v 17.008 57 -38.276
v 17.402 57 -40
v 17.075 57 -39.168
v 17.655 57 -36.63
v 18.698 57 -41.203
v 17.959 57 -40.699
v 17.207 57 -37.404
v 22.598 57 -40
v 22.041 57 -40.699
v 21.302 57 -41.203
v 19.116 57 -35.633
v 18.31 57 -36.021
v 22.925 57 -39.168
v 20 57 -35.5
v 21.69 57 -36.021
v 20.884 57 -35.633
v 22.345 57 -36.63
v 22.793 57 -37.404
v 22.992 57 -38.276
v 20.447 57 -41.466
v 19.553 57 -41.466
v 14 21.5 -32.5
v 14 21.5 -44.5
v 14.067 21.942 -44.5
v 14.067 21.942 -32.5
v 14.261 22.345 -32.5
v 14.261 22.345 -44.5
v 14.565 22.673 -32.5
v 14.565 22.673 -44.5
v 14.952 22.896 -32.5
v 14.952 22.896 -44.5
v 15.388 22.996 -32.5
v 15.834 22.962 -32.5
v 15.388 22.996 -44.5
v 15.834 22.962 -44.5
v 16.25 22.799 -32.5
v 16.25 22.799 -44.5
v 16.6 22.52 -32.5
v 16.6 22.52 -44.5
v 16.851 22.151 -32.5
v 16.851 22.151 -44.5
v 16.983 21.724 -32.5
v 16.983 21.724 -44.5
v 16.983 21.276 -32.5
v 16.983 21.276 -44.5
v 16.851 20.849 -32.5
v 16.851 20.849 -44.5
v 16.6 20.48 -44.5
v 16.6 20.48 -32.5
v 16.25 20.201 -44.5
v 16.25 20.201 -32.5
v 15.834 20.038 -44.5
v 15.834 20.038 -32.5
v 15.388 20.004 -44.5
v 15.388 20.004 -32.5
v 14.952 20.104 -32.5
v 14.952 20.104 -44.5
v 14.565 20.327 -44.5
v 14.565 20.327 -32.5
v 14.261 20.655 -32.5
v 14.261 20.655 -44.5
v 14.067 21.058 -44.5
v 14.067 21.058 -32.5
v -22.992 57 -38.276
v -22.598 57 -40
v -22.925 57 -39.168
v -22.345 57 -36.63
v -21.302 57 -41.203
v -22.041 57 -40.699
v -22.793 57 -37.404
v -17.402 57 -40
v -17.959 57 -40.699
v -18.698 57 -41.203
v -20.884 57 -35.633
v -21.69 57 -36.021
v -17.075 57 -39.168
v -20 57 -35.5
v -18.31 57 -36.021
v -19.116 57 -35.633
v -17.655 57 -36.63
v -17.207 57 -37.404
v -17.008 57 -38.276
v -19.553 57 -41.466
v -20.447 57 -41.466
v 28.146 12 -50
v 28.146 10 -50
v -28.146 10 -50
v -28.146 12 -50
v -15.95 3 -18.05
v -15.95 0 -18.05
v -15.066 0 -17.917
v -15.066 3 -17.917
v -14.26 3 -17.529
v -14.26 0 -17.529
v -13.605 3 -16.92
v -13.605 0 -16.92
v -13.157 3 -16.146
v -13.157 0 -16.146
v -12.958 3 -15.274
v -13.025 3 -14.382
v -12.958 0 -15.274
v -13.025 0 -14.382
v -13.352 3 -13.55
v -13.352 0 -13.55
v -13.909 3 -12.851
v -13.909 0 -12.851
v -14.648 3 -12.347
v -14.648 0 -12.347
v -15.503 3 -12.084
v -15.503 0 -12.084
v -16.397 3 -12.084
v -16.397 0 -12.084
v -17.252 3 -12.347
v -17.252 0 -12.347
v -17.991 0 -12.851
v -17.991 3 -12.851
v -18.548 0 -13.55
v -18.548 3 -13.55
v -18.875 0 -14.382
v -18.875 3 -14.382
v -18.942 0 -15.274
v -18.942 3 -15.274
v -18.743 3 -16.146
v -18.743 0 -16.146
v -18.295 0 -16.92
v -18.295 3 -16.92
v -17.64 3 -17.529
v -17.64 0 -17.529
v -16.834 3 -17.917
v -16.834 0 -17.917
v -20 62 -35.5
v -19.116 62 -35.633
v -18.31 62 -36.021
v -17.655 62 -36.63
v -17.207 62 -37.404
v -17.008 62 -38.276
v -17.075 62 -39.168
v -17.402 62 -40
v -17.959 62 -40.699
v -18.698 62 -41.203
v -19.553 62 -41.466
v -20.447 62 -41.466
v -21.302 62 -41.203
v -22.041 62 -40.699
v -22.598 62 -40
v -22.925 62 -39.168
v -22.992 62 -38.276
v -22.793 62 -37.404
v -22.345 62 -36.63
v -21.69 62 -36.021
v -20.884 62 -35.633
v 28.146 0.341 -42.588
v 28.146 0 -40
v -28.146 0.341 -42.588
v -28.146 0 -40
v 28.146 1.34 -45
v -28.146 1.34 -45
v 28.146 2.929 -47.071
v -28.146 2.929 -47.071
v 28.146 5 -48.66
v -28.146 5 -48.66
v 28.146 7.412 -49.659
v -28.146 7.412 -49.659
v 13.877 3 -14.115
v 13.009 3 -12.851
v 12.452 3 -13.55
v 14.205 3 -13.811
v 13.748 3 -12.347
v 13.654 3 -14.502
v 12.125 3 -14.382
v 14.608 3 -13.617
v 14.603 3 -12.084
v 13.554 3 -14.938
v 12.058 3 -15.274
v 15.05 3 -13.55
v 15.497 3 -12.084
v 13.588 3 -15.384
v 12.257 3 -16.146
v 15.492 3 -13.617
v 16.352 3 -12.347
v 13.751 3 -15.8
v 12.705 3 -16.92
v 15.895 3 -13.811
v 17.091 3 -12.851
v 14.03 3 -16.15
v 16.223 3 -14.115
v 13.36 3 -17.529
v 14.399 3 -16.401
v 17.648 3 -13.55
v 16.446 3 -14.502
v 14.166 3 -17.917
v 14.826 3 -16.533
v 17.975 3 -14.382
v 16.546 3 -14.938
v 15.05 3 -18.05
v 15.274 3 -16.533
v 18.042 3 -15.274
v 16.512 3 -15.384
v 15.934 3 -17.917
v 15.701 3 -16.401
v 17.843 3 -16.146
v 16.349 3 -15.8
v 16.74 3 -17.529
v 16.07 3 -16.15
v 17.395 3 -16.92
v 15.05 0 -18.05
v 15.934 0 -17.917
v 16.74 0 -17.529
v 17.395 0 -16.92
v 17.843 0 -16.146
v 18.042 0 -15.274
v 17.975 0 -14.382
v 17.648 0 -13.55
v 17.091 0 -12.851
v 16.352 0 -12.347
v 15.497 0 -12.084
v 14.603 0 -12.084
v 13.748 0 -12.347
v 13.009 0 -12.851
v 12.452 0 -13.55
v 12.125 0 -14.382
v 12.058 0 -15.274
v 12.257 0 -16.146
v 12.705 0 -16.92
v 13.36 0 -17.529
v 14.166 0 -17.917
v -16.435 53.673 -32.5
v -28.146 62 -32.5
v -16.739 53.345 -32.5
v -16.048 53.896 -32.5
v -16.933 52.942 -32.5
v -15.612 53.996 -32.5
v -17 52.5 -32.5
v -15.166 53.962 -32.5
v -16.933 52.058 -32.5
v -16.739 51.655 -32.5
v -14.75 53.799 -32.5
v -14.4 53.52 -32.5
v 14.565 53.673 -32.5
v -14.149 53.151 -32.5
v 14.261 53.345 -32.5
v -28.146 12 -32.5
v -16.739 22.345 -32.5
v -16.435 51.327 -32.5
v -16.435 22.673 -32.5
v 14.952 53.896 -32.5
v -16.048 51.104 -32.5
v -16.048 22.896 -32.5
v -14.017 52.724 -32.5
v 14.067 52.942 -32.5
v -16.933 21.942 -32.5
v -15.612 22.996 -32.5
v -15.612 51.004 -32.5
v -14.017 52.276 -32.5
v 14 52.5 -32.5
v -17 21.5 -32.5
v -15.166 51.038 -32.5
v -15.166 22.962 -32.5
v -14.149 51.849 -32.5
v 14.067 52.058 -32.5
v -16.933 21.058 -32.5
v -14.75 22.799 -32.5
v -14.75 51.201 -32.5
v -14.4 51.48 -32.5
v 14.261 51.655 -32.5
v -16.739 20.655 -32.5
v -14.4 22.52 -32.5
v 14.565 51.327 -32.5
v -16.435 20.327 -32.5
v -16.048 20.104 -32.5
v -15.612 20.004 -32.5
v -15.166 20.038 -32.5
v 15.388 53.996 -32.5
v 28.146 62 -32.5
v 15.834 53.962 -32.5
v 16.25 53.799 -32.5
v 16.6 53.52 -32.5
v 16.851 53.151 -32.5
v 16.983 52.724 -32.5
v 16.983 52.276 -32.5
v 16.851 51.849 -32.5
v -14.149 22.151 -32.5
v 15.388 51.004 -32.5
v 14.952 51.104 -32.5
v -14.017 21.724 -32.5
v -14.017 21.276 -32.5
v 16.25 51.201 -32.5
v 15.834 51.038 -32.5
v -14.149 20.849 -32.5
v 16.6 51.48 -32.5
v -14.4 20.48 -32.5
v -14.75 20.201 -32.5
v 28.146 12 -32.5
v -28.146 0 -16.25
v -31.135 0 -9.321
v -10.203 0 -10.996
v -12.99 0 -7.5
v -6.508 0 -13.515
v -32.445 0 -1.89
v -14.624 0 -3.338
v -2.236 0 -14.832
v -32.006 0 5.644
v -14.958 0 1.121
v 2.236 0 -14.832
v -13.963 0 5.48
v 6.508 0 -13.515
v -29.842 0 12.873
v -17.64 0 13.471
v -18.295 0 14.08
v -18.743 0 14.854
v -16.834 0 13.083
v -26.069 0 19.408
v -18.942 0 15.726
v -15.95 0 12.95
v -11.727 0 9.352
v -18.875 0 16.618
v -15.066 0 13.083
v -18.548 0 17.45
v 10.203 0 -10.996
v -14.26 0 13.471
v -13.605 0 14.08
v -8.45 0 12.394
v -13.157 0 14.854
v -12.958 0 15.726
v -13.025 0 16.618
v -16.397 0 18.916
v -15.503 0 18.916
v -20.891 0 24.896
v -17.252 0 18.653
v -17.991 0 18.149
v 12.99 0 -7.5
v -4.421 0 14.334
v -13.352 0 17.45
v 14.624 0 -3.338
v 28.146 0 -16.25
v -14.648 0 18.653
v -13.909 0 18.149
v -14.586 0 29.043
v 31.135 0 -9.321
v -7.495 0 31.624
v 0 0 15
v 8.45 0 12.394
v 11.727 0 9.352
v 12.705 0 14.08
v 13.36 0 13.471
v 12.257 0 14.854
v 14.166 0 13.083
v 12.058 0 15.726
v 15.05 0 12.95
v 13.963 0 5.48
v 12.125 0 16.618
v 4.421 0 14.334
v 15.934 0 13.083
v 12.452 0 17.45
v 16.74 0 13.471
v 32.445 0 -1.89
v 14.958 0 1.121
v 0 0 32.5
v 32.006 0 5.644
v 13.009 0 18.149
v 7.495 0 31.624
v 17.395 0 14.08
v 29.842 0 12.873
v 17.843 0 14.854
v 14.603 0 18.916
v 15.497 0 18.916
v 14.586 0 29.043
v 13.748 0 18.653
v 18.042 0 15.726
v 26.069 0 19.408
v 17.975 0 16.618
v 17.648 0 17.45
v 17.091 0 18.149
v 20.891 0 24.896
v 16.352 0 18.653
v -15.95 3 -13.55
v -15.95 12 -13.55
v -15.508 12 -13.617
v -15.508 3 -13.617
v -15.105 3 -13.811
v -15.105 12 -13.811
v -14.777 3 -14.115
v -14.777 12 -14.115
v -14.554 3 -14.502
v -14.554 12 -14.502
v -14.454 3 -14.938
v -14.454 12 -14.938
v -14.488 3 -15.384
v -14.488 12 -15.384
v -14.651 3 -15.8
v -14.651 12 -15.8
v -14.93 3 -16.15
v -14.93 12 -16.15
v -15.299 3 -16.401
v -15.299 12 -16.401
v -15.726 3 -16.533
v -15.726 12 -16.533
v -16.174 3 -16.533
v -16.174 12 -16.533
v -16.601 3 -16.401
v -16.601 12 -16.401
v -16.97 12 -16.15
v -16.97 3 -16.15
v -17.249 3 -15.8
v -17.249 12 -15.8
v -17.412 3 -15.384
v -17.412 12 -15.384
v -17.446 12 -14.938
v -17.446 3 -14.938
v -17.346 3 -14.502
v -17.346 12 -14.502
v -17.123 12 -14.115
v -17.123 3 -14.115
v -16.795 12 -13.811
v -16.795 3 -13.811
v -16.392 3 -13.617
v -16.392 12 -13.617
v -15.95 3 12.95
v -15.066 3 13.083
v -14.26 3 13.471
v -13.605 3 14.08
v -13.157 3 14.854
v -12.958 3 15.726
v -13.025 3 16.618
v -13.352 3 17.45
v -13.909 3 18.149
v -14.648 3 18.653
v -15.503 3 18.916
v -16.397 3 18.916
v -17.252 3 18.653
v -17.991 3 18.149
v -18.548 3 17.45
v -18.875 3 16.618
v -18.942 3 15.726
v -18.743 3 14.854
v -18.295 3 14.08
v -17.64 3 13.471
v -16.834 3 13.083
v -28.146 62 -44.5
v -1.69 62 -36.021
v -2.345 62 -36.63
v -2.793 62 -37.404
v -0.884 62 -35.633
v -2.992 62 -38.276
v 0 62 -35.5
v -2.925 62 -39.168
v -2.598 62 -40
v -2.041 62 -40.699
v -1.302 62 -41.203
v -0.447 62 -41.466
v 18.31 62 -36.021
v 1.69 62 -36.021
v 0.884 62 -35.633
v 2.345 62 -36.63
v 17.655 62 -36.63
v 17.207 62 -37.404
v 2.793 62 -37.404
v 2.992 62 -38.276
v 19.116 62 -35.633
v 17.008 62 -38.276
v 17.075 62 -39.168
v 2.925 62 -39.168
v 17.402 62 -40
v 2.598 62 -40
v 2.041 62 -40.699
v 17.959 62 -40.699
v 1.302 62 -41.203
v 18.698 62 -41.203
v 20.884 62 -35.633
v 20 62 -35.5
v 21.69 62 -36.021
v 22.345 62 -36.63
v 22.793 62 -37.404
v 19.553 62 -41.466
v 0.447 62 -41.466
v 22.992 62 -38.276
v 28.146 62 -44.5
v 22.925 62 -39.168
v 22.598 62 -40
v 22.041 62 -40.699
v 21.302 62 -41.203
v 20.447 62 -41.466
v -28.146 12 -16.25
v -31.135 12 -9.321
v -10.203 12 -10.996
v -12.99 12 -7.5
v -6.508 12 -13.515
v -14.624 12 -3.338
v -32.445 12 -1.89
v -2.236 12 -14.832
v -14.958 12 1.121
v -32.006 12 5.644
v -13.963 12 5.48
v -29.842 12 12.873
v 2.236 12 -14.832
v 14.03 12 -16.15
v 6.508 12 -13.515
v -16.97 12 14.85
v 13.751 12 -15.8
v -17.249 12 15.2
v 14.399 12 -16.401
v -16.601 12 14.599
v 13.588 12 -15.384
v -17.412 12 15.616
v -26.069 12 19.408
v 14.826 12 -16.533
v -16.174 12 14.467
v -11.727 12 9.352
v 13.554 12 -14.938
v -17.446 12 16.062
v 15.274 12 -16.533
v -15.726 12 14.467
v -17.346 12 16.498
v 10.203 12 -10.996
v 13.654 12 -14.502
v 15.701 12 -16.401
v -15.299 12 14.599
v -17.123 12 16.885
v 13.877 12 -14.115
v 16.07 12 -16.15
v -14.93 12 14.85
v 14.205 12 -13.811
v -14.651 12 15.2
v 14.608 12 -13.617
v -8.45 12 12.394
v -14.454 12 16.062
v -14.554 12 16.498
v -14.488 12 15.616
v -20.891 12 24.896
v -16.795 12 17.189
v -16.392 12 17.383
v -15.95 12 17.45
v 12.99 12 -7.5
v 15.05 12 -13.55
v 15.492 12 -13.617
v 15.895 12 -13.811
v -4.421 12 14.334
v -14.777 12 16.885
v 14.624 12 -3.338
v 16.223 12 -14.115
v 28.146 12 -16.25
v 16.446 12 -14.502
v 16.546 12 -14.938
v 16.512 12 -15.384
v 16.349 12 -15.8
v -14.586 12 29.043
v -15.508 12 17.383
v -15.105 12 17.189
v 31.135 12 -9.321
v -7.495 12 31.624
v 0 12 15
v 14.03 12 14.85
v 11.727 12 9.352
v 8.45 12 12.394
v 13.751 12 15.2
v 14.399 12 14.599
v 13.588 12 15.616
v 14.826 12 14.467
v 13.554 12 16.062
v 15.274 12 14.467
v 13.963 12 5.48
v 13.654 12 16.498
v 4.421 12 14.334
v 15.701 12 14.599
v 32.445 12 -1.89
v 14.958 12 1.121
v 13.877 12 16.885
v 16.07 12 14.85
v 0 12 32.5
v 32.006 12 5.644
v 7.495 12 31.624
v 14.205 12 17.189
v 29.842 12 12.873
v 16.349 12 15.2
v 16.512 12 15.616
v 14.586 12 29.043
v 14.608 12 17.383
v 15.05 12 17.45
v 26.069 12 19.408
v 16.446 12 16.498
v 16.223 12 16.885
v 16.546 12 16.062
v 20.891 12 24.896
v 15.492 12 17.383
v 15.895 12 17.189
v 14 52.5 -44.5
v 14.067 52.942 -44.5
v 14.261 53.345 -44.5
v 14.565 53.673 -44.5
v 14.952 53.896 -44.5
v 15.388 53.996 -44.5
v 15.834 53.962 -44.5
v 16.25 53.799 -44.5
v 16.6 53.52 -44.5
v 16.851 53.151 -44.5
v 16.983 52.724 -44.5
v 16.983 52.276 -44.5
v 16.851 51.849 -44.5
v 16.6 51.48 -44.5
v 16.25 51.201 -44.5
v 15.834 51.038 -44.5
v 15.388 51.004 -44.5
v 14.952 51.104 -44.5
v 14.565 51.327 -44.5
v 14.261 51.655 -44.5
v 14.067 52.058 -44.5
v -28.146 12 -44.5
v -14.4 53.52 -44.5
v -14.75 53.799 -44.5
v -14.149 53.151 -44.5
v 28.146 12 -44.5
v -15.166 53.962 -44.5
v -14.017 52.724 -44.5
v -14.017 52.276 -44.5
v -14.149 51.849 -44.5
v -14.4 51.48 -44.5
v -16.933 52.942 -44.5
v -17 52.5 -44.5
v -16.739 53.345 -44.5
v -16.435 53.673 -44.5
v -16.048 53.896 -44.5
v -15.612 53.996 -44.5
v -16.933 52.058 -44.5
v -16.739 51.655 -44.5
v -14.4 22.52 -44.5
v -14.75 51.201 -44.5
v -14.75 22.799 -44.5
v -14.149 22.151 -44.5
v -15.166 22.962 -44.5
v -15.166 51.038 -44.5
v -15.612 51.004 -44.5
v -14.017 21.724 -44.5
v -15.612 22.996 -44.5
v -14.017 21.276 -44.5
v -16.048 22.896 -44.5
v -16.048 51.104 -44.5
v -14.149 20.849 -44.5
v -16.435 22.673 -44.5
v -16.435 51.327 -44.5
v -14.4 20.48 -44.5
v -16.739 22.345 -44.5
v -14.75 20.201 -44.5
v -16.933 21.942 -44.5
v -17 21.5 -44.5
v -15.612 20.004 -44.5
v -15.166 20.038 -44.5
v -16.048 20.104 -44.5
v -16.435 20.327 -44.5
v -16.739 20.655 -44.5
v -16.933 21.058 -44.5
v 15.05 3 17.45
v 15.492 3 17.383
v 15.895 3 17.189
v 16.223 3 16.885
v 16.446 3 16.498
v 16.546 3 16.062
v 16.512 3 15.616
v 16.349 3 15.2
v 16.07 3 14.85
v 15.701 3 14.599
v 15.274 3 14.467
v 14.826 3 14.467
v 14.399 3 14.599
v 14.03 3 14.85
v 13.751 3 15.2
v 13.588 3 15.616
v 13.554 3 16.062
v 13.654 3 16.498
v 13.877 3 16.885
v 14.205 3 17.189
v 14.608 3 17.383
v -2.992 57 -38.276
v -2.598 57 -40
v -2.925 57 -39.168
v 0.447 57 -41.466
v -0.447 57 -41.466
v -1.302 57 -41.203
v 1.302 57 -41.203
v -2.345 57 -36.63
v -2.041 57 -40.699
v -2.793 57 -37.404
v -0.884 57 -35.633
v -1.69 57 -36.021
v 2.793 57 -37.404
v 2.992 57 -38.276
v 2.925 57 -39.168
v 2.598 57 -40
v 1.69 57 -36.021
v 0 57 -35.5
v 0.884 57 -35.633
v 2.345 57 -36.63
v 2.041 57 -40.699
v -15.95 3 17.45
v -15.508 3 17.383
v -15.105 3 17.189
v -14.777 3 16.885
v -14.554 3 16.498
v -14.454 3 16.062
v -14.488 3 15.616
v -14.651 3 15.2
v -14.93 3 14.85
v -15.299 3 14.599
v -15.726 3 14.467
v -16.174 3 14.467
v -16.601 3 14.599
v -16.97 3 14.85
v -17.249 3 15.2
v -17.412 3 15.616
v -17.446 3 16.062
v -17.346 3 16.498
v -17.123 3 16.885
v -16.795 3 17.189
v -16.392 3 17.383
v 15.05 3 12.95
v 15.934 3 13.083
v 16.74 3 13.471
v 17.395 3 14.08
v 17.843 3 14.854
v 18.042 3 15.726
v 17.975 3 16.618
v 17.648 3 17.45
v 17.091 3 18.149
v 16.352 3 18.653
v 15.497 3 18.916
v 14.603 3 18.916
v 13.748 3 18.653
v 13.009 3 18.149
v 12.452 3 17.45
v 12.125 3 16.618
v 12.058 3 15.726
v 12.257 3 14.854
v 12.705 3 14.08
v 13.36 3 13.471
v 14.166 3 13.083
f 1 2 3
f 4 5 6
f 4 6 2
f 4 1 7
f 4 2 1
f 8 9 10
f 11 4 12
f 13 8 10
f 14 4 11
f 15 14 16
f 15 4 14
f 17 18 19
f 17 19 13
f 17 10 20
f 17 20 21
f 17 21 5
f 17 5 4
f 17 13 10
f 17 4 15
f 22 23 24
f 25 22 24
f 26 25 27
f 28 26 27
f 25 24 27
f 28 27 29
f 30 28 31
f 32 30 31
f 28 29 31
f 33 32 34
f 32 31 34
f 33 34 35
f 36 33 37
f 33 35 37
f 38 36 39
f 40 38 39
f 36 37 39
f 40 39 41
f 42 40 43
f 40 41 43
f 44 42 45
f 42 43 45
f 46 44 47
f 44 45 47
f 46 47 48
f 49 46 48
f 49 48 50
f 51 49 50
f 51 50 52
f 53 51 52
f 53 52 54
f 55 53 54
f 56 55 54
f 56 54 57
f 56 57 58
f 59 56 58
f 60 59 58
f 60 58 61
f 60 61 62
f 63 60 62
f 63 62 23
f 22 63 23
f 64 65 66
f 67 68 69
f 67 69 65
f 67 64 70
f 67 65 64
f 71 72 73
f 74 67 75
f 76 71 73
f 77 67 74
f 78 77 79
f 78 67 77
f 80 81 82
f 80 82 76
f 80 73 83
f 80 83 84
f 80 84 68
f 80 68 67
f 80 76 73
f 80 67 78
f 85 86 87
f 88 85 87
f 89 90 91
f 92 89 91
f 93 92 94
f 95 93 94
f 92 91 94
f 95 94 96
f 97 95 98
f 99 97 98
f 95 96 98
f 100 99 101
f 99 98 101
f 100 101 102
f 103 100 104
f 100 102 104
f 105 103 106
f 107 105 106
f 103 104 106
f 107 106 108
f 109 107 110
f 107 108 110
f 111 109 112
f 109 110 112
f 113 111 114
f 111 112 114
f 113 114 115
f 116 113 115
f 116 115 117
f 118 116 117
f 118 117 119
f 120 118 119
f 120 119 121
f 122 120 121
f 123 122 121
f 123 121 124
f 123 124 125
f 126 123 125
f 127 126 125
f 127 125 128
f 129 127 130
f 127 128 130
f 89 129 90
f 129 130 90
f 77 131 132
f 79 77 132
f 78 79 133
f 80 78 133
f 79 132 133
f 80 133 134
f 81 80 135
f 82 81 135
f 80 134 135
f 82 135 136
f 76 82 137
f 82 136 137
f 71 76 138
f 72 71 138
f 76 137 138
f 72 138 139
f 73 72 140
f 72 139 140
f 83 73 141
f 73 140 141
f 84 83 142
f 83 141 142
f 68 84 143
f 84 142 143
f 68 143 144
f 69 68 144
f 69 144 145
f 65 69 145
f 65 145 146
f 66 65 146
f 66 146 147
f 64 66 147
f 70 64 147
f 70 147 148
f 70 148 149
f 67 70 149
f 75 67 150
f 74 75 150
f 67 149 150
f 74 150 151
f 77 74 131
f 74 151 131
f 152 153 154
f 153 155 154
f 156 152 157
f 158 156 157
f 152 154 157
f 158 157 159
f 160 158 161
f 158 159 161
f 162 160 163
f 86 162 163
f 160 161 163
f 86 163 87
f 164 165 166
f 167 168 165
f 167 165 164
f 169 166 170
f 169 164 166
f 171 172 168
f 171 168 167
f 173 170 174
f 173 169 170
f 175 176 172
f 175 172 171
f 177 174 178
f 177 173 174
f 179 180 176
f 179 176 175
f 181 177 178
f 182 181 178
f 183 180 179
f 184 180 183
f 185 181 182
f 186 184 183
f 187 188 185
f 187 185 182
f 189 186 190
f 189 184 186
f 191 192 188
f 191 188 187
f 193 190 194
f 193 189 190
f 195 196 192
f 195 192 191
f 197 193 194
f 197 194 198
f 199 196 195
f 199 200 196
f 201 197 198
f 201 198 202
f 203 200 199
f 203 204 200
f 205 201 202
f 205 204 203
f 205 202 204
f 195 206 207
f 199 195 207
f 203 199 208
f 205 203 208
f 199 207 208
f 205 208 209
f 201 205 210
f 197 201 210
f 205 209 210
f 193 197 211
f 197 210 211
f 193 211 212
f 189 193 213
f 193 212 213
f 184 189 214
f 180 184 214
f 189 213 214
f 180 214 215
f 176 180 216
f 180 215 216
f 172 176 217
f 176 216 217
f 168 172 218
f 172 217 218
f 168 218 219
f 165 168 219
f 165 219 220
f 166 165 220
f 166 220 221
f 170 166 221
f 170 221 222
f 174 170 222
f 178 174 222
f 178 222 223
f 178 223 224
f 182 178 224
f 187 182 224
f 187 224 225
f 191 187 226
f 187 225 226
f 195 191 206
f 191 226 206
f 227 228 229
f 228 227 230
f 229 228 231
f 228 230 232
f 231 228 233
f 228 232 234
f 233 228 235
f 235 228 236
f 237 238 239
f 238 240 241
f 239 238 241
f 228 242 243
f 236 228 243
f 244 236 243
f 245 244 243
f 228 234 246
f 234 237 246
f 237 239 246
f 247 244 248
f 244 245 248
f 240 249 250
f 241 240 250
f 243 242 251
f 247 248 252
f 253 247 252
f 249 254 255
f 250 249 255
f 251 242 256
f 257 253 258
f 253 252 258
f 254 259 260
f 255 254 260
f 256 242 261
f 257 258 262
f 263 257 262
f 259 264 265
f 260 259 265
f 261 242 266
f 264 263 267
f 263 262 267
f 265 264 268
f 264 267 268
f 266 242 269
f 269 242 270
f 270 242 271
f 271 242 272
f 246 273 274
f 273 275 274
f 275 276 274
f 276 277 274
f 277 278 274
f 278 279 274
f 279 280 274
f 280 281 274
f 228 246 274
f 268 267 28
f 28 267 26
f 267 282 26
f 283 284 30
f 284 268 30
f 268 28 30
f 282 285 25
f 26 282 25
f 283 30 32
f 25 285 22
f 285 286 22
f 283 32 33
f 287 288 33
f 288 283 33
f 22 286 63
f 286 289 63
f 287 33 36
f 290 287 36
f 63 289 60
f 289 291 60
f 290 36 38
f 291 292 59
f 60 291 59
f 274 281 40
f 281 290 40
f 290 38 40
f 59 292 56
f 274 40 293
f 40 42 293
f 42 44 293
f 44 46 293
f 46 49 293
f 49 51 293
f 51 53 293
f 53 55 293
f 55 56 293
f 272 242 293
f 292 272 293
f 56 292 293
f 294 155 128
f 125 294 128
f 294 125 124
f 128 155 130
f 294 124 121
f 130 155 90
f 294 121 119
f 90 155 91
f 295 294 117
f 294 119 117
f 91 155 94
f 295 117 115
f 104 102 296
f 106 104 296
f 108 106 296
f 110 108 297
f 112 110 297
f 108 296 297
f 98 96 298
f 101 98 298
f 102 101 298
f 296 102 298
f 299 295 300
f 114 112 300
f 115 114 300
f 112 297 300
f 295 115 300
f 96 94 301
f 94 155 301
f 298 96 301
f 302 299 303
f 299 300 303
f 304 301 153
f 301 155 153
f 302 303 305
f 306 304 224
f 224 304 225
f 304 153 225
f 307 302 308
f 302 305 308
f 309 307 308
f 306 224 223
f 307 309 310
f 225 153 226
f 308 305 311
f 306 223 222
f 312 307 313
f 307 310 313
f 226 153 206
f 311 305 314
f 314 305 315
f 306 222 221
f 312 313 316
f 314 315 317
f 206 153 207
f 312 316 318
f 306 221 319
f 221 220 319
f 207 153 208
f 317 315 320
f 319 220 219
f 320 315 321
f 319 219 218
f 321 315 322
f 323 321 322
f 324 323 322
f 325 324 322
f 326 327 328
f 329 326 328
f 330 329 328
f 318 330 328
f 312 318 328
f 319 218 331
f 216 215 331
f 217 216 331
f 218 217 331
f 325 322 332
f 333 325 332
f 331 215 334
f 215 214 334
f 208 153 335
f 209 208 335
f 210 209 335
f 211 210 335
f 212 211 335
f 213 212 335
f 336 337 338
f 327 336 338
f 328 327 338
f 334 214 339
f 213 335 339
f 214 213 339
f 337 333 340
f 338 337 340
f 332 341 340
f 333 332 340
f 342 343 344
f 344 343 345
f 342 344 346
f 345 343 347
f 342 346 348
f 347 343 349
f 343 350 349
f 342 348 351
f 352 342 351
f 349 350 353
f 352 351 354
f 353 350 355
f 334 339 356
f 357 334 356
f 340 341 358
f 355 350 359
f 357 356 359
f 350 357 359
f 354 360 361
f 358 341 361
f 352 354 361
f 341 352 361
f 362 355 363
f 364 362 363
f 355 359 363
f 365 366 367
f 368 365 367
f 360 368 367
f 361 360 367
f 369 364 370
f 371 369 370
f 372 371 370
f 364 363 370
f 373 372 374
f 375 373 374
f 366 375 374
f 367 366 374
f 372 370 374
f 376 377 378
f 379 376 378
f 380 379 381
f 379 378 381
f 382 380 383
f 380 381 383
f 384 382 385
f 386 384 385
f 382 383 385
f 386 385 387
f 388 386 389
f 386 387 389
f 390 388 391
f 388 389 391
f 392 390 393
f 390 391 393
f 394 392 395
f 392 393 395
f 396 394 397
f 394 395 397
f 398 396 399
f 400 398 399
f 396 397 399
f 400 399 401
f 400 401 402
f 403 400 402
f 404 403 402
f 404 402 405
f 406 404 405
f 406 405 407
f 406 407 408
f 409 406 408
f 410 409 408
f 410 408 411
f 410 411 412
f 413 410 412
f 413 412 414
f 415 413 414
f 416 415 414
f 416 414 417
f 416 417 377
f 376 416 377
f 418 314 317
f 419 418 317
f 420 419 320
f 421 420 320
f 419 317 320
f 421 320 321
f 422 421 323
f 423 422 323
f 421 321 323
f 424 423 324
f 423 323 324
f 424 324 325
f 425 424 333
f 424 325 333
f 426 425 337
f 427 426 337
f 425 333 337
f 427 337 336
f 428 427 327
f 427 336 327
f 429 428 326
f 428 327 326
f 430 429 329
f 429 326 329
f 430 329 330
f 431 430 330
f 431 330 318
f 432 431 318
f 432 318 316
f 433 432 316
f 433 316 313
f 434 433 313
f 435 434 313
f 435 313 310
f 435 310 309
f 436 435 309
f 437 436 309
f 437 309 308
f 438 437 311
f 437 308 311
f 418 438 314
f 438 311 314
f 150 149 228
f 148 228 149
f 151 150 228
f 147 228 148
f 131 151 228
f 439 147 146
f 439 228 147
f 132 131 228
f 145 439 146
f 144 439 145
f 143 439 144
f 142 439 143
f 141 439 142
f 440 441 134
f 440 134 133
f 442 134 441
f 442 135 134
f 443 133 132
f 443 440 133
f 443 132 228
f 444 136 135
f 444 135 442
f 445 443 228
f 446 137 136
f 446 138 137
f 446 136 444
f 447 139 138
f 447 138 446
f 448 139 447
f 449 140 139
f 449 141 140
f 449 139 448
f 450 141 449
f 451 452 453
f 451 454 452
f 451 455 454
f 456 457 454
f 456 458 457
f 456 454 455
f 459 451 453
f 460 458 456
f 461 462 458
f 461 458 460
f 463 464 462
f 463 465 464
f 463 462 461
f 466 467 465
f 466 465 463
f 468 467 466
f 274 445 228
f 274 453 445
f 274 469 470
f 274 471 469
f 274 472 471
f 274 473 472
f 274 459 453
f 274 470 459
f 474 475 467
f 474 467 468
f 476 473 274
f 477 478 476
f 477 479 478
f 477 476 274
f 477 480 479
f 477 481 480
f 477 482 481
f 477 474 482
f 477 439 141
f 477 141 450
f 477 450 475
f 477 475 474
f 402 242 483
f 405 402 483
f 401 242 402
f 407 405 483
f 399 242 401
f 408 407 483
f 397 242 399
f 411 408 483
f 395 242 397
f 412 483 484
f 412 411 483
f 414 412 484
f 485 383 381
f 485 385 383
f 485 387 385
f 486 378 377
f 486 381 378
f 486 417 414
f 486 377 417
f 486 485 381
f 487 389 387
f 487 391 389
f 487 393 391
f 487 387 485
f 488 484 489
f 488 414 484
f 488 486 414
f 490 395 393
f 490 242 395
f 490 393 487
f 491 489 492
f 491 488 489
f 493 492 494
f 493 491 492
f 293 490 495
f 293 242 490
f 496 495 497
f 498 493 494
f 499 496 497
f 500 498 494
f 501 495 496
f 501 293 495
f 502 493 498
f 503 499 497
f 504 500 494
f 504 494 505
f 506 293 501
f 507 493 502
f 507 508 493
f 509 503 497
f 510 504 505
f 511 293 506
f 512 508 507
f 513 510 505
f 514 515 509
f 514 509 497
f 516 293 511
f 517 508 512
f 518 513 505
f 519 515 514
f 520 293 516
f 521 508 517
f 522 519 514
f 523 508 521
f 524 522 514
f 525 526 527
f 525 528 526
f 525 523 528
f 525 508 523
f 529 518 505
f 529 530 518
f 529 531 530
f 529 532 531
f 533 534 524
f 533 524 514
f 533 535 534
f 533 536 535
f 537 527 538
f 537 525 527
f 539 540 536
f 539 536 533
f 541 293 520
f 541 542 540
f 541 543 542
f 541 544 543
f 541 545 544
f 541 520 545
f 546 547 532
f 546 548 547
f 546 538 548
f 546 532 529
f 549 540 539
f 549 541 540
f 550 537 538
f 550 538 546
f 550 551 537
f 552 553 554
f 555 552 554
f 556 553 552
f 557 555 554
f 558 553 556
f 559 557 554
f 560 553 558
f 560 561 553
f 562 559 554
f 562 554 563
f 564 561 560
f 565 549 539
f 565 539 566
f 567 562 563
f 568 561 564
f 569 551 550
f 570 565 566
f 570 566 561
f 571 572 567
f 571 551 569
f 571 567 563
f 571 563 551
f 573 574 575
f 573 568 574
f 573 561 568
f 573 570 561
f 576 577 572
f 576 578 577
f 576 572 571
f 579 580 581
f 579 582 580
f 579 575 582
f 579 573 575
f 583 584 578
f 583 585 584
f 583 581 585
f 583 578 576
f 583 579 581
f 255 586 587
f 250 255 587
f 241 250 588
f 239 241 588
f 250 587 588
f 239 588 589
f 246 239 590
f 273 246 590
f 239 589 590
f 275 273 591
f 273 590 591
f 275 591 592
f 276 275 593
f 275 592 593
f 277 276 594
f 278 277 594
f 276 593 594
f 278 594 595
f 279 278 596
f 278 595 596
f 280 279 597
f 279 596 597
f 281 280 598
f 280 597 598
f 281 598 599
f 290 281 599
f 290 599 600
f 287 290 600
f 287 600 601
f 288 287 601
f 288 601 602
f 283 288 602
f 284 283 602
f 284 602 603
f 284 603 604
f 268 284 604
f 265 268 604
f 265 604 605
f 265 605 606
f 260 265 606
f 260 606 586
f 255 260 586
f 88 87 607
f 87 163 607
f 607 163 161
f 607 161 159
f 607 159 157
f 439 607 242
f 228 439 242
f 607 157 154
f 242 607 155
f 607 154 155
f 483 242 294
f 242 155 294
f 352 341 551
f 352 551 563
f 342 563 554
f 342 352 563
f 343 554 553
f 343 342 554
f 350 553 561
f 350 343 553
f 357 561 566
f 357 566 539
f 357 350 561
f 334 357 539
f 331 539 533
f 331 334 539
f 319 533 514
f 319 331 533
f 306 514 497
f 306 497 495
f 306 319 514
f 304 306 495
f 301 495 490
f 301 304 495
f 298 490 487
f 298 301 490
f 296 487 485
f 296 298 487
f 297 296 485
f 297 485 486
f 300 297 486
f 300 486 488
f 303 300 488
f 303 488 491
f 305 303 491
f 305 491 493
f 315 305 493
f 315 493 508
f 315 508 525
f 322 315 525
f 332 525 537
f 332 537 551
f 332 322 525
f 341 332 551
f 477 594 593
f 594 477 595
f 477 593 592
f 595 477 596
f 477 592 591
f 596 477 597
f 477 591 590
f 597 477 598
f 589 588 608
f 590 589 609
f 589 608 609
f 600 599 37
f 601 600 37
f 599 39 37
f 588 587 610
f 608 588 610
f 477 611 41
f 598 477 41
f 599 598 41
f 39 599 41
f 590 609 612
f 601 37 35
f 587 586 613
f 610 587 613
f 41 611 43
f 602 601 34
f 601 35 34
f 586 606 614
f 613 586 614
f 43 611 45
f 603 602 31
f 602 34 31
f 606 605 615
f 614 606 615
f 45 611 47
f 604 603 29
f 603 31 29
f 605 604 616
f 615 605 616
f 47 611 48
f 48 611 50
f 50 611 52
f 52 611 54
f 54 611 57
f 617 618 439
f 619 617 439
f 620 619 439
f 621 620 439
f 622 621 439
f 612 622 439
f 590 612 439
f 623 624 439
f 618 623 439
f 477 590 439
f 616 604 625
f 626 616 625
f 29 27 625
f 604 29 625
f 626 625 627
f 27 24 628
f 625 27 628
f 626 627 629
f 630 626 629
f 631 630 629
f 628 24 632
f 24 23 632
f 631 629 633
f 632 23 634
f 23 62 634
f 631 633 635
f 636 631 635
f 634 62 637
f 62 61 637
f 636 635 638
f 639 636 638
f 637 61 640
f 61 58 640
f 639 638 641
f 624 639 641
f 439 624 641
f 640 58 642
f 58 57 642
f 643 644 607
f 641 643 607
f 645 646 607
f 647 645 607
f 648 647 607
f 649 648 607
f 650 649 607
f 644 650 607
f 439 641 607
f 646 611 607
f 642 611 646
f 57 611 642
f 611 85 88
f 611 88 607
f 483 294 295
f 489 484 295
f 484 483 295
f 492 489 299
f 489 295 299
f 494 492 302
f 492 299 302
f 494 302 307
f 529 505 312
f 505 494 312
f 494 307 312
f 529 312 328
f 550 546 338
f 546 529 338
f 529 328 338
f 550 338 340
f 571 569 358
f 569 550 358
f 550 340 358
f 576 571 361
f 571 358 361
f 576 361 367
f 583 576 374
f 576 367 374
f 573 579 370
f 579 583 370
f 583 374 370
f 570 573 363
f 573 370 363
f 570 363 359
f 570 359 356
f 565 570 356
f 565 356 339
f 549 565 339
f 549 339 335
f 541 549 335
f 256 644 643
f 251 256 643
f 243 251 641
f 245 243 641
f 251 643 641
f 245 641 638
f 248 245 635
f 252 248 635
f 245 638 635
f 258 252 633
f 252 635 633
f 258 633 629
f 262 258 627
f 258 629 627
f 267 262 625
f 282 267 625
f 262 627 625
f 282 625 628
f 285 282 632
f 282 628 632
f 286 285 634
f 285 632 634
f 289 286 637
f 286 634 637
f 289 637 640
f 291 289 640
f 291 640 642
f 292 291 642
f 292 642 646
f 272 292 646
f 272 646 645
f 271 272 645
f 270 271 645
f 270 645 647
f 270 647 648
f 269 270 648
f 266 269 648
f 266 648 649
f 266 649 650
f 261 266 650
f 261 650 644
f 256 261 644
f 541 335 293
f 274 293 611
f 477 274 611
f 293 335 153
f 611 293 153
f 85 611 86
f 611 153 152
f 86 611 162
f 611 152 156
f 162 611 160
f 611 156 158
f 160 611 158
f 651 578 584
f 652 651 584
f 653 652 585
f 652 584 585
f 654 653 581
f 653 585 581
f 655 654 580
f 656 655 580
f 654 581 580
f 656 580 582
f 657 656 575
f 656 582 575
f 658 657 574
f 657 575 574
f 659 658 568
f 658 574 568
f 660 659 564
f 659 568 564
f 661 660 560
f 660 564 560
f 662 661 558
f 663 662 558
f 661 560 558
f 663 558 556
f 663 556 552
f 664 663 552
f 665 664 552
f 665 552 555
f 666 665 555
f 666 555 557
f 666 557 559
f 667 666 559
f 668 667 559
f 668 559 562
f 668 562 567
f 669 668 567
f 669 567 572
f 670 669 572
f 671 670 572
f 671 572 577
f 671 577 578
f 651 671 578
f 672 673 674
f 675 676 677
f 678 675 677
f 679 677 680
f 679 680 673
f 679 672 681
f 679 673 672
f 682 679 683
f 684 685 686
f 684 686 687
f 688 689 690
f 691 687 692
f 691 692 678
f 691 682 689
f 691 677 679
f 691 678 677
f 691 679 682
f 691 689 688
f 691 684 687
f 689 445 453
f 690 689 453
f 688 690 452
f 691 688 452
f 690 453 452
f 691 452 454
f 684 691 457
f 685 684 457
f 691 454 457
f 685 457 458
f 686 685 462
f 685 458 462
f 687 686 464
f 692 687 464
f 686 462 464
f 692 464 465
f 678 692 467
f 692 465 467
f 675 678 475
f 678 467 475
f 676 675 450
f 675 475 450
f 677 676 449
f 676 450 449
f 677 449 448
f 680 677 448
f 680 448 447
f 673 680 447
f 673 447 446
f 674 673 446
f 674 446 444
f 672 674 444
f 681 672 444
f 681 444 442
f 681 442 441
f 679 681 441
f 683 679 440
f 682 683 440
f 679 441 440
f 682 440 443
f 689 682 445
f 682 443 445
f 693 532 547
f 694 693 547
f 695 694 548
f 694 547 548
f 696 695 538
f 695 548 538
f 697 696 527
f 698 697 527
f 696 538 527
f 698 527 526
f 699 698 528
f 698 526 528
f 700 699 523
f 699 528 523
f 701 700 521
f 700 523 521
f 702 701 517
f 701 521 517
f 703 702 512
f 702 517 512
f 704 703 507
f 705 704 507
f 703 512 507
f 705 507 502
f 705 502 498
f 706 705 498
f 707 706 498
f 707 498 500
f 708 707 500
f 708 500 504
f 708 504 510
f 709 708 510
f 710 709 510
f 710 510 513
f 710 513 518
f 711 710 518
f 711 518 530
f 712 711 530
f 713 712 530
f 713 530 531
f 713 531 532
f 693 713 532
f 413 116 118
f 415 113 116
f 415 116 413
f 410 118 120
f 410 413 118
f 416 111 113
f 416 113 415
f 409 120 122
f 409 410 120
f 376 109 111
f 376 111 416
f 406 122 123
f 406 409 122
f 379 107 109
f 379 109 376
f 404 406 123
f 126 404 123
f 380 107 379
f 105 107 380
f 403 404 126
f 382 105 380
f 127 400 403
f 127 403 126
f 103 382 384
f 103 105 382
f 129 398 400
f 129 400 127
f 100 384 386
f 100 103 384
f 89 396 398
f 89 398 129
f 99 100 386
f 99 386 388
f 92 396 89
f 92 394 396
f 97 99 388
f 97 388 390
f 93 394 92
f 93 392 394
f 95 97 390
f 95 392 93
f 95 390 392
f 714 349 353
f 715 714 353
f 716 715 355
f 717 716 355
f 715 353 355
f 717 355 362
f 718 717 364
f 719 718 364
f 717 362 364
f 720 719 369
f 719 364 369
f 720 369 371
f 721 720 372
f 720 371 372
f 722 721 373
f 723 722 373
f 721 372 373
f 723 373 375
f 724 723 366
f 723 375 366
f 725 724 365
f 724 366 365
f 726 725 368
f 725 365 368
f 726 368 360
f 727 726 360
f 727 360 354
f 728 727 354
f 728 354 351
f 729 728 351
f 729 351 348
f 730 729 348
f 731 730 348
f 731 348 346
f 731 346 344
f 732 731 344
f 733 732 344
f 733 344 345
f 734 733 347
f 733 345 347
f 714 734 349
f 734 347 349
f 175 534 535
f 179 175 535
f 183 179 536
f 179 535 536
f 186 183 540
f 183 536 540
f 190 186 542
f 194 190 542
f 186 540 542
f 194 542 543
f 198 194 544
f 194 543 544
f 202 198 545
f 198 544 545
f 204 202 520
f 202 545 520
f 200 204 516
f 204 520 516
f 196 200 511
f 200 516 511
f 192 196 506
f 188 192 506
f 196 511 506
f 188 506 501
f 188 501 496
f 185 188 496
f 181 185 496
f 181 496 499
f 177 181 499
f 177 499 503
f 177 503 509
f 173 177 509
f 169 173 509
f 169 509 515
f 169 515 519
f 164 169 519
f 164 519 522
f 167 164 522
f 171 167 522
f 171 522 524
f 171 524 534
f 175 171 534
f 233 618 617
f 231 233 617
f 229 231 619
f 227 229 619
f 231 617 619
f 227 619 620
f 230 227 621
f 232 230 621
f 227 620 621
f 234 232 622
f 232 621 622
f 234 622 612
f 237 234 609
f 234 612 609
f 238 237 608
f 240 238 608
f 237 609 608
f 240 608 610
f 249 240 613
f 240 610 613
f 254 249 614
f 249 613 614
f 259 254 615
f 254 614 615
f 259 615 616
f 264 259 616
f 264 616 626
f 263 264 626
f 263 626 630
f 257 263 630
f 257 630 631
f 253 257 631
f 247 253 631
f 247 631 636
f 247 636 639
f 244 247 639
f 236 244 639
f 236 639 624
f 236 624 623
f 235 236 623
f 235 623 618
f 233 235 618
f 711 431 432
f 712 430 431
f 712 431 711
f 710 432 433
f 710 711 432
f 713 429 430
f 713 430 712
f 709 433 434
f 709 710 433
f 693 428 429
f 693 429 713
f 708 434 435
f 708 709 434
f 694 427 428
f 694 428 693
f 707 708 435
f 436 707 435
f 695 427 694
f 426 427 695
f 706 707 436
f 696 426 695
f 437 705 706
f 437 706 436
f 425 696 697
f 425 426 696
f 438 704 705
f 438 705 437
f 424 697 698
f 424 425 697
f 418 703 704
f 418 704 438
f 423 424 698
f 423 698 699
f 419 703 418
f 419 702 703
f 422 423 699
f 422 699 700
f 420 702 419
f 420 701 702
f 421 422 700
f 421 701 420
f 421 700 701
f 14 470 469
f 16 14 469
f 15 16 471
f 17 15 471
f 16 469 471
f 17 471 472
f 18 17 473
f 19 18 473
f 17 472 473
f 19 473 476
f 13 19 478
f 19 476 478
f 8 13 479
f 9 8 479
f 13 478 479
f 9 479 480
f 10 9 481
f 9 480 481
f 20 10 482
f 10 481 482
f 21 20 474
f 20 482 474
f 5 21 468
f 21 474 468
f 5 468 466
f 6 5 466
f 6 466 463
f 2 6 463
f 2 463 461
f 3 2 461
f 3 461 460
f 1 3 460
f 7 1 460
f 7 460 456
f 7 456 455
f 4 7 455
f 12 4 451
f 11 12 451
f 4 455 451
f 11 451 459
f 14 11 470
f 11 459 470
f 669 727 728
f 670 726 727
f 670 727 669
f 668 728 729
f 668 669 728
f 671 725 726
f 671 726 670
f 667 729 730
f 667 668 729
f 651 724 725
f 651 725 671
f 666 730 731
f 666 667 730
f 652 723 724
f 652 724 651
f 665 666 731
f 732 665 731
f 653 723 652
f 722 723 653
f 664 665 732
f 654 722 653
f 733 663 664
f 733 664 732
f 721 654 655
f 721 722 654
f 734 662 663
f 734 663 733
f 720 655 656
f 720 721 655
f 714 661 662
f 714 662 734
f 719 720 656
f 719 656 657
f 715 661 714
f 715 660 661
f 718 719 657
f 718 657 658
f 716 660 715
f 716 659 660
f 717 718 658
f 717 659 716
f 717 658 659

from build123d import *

# Parameters (mm, degrees)
SKETCH_1_R          = 32.5
SKETCH_1_R_2        = 15
EXTRUDE_1_DEPTH     = 12
SKETCH_2_R          = 1.5
CUT_EXTRUDE_1_DEPTH = 12
EXTRUDE_START       = -12
EXTRUDE_2_DEPTH     = 12
EXTRUDE_3_DEPTH     = 50
SKETCH_5_R          = 3
CUT_EXTRUDE_2_DEPTH = 5
SKETCH_6_R          = 3
CUT_EXTRUDE_3_DEPTH = 3
SKETCH_7_R          = 1.5
CUT_EXTRUDE_9_DEPTH = 105.063682426
FILLET_1_R          = 10


with BuildPart() as part:
    # 草图1 → 凸台-拉伸1 (new body)
    with BuildSketch(Plane(origin=(0, 0, 0), x_dir=(1, 0, 0), z_dir=(0, 1, 0))):
        with Locations(Location((0, 0, 0), (0, 0, 270))):
            Circle(SKETCH_1_R)
        with Locations(Location((0, 0, 0), (0, 0, 270))):
            Circle(SKETCH_1_R_2, mode=Mode.SUBTRACT)
    extrude(amount=EXTRUDE_1_DEPTH)

    # 草图2 → 切除-拉伸1 (cut)
    with BuildSketch(Plane(origin=(0, 12, 0), x_dir=(1, 0, 0), z_dir=(0, 1, 0))):
        with Locations(Location((-15.95, 15.05, 0), (0, 0, 270))):
            Circle(SKETCH_2_R)
        with Locations(Location((15.05, 15.05, 0), (0, 0, 270))):
            Circle(SKETCH_2_R)
        with Locations(Location((15.05, -15.95, 0), (0, 0, 270))):
            Circle(SKETCH_2_R)
        with Locations(Location((-15.95, -15.95, 0), (0, 0, 270))):
            Circle(SKETCH_2_R)
    extrude(amount=-CUT_EXTRUDE_1_DEPTH, mode=Mode.SUBTRACT)

    # 草图3 → 凸台-拉伸2 (add)
    with BuildSketch(Plane(origin=(0, 12, 0), x_dir=(1, 0, 0), z_dir=(0, 1, 0)).offset(EXTRUDE_START)):
        with BuildLine():
            Line((-28.145825623, 50), (-28.145825623, 16.25))
            ThreePointArc((-28.145825623, 16.25), (-16.25, 28.145825623), (0, 32.5))
            Line((0, 32.5), (0, 50))
            Line((0, 50), (-28.145825623, 50))
        make_face()
        with BuildLine():
            ThreePointArc((0, 32.5), (16.25, 28.145825623), (28.145825623, 16.25))
            Line((28.145825623, 16.25), (28.145825623, 50))
            Line((28.145825623, 50), (0, 50))
            Line((0, 50), (0, 32.5))
        make_face()
    extrude(amount=EXTRUDE_2_DEPTH)

    # 草图4 → 凸台-拉伸3 (add)
    with BuildSketch(Plane(origin=(0, 12, 0), x_dir=(1, 0, 0), z_dir=(0, 1, 0))):
        Polygon((28.145825623, 32.5), (28.145825623, 44.5), (-28.145825623, 44.5), (-28.145825623, 32.5), (0, 32.5), align=None)
    extrude(amount=EXTRUDE_3_DEPTH)

    # 草图5 → 切除-拉伸2 (cut)
    with BuildSketch(Plane(origin=(0, 62, 0), x_dir=(1, 0, 0), z_dir=(0, 1, 0))):
        with Locations(Location((0, 38.5, 0), (0, 0, 270))):
            Circle(SKETCH_5_R)
        with Locations(Location((20, 38.5, 0), (0, 0, 270))):
            Circle(SKETCH_5_R)
        with Locations(Location((-20, 38.5, 0), (0, 0, 270))):
            Circle(SKETCH_5_R)
    extrude(amount=-CUT_EXTRUDE_2_DEPTH, mode=Mode.SUBTRACT)

    # 草图6 → 切除-拉伸3 (cut)
    with BuildSketch(Plane.XZ):
        with Locations(Location((15.05, 15.95, 0), (0, 0, 270))):
            Circle(SKETCH_6_R)
        with Locations(Location((-15.95, 15.95, 0), (0, 0, 270))):
            Circle(SKETCH_6_R)
        with Locations(Location((-15.95, -15.05, 0), (0, 0, 270))):
            Circle(SKETCH_6_R)
        with Locations(Location((15.05, -15.05, 0), (0, 0, 270))):
            Circle(SKETCH_6_R)
    extrude(amount=-CUT_EXTRUDE_3_DEPTH, mode=Mode.SUBTRACT)

    # 草图7 → 切除-拉伸9 (cut, through all)
    with BuildSketch(Plane(origin=(0, 0, -44.5), x_dir=(-1, 0, 0), z_dir=(0, 0, -1))):
        with Locations((15.5, 52.5)):
            Circle(SKETCH_7_R)
        with Locations((15.5, 21.5)):
            Circle(SKETCH_7_R)
        with Locations((-15.5, 52.5)):
            Circle(SKETCH_7_R)
        with Locations((-15.5, 21.5)):
            Circle(SKETCH_7_R)
    extrude(amount=-CUT_EXTRUDE_9_DEPTH, mode=Mode.SUBTRACT)

    # 圆角1
    fillet_1_edges = [part.edges().sort_by_distance(p)[0] for p in [
        (0, 0, -50),
    ]]
    fillet(fillet_1_edges, radius=FILLET_1_R)


solid = part.part
